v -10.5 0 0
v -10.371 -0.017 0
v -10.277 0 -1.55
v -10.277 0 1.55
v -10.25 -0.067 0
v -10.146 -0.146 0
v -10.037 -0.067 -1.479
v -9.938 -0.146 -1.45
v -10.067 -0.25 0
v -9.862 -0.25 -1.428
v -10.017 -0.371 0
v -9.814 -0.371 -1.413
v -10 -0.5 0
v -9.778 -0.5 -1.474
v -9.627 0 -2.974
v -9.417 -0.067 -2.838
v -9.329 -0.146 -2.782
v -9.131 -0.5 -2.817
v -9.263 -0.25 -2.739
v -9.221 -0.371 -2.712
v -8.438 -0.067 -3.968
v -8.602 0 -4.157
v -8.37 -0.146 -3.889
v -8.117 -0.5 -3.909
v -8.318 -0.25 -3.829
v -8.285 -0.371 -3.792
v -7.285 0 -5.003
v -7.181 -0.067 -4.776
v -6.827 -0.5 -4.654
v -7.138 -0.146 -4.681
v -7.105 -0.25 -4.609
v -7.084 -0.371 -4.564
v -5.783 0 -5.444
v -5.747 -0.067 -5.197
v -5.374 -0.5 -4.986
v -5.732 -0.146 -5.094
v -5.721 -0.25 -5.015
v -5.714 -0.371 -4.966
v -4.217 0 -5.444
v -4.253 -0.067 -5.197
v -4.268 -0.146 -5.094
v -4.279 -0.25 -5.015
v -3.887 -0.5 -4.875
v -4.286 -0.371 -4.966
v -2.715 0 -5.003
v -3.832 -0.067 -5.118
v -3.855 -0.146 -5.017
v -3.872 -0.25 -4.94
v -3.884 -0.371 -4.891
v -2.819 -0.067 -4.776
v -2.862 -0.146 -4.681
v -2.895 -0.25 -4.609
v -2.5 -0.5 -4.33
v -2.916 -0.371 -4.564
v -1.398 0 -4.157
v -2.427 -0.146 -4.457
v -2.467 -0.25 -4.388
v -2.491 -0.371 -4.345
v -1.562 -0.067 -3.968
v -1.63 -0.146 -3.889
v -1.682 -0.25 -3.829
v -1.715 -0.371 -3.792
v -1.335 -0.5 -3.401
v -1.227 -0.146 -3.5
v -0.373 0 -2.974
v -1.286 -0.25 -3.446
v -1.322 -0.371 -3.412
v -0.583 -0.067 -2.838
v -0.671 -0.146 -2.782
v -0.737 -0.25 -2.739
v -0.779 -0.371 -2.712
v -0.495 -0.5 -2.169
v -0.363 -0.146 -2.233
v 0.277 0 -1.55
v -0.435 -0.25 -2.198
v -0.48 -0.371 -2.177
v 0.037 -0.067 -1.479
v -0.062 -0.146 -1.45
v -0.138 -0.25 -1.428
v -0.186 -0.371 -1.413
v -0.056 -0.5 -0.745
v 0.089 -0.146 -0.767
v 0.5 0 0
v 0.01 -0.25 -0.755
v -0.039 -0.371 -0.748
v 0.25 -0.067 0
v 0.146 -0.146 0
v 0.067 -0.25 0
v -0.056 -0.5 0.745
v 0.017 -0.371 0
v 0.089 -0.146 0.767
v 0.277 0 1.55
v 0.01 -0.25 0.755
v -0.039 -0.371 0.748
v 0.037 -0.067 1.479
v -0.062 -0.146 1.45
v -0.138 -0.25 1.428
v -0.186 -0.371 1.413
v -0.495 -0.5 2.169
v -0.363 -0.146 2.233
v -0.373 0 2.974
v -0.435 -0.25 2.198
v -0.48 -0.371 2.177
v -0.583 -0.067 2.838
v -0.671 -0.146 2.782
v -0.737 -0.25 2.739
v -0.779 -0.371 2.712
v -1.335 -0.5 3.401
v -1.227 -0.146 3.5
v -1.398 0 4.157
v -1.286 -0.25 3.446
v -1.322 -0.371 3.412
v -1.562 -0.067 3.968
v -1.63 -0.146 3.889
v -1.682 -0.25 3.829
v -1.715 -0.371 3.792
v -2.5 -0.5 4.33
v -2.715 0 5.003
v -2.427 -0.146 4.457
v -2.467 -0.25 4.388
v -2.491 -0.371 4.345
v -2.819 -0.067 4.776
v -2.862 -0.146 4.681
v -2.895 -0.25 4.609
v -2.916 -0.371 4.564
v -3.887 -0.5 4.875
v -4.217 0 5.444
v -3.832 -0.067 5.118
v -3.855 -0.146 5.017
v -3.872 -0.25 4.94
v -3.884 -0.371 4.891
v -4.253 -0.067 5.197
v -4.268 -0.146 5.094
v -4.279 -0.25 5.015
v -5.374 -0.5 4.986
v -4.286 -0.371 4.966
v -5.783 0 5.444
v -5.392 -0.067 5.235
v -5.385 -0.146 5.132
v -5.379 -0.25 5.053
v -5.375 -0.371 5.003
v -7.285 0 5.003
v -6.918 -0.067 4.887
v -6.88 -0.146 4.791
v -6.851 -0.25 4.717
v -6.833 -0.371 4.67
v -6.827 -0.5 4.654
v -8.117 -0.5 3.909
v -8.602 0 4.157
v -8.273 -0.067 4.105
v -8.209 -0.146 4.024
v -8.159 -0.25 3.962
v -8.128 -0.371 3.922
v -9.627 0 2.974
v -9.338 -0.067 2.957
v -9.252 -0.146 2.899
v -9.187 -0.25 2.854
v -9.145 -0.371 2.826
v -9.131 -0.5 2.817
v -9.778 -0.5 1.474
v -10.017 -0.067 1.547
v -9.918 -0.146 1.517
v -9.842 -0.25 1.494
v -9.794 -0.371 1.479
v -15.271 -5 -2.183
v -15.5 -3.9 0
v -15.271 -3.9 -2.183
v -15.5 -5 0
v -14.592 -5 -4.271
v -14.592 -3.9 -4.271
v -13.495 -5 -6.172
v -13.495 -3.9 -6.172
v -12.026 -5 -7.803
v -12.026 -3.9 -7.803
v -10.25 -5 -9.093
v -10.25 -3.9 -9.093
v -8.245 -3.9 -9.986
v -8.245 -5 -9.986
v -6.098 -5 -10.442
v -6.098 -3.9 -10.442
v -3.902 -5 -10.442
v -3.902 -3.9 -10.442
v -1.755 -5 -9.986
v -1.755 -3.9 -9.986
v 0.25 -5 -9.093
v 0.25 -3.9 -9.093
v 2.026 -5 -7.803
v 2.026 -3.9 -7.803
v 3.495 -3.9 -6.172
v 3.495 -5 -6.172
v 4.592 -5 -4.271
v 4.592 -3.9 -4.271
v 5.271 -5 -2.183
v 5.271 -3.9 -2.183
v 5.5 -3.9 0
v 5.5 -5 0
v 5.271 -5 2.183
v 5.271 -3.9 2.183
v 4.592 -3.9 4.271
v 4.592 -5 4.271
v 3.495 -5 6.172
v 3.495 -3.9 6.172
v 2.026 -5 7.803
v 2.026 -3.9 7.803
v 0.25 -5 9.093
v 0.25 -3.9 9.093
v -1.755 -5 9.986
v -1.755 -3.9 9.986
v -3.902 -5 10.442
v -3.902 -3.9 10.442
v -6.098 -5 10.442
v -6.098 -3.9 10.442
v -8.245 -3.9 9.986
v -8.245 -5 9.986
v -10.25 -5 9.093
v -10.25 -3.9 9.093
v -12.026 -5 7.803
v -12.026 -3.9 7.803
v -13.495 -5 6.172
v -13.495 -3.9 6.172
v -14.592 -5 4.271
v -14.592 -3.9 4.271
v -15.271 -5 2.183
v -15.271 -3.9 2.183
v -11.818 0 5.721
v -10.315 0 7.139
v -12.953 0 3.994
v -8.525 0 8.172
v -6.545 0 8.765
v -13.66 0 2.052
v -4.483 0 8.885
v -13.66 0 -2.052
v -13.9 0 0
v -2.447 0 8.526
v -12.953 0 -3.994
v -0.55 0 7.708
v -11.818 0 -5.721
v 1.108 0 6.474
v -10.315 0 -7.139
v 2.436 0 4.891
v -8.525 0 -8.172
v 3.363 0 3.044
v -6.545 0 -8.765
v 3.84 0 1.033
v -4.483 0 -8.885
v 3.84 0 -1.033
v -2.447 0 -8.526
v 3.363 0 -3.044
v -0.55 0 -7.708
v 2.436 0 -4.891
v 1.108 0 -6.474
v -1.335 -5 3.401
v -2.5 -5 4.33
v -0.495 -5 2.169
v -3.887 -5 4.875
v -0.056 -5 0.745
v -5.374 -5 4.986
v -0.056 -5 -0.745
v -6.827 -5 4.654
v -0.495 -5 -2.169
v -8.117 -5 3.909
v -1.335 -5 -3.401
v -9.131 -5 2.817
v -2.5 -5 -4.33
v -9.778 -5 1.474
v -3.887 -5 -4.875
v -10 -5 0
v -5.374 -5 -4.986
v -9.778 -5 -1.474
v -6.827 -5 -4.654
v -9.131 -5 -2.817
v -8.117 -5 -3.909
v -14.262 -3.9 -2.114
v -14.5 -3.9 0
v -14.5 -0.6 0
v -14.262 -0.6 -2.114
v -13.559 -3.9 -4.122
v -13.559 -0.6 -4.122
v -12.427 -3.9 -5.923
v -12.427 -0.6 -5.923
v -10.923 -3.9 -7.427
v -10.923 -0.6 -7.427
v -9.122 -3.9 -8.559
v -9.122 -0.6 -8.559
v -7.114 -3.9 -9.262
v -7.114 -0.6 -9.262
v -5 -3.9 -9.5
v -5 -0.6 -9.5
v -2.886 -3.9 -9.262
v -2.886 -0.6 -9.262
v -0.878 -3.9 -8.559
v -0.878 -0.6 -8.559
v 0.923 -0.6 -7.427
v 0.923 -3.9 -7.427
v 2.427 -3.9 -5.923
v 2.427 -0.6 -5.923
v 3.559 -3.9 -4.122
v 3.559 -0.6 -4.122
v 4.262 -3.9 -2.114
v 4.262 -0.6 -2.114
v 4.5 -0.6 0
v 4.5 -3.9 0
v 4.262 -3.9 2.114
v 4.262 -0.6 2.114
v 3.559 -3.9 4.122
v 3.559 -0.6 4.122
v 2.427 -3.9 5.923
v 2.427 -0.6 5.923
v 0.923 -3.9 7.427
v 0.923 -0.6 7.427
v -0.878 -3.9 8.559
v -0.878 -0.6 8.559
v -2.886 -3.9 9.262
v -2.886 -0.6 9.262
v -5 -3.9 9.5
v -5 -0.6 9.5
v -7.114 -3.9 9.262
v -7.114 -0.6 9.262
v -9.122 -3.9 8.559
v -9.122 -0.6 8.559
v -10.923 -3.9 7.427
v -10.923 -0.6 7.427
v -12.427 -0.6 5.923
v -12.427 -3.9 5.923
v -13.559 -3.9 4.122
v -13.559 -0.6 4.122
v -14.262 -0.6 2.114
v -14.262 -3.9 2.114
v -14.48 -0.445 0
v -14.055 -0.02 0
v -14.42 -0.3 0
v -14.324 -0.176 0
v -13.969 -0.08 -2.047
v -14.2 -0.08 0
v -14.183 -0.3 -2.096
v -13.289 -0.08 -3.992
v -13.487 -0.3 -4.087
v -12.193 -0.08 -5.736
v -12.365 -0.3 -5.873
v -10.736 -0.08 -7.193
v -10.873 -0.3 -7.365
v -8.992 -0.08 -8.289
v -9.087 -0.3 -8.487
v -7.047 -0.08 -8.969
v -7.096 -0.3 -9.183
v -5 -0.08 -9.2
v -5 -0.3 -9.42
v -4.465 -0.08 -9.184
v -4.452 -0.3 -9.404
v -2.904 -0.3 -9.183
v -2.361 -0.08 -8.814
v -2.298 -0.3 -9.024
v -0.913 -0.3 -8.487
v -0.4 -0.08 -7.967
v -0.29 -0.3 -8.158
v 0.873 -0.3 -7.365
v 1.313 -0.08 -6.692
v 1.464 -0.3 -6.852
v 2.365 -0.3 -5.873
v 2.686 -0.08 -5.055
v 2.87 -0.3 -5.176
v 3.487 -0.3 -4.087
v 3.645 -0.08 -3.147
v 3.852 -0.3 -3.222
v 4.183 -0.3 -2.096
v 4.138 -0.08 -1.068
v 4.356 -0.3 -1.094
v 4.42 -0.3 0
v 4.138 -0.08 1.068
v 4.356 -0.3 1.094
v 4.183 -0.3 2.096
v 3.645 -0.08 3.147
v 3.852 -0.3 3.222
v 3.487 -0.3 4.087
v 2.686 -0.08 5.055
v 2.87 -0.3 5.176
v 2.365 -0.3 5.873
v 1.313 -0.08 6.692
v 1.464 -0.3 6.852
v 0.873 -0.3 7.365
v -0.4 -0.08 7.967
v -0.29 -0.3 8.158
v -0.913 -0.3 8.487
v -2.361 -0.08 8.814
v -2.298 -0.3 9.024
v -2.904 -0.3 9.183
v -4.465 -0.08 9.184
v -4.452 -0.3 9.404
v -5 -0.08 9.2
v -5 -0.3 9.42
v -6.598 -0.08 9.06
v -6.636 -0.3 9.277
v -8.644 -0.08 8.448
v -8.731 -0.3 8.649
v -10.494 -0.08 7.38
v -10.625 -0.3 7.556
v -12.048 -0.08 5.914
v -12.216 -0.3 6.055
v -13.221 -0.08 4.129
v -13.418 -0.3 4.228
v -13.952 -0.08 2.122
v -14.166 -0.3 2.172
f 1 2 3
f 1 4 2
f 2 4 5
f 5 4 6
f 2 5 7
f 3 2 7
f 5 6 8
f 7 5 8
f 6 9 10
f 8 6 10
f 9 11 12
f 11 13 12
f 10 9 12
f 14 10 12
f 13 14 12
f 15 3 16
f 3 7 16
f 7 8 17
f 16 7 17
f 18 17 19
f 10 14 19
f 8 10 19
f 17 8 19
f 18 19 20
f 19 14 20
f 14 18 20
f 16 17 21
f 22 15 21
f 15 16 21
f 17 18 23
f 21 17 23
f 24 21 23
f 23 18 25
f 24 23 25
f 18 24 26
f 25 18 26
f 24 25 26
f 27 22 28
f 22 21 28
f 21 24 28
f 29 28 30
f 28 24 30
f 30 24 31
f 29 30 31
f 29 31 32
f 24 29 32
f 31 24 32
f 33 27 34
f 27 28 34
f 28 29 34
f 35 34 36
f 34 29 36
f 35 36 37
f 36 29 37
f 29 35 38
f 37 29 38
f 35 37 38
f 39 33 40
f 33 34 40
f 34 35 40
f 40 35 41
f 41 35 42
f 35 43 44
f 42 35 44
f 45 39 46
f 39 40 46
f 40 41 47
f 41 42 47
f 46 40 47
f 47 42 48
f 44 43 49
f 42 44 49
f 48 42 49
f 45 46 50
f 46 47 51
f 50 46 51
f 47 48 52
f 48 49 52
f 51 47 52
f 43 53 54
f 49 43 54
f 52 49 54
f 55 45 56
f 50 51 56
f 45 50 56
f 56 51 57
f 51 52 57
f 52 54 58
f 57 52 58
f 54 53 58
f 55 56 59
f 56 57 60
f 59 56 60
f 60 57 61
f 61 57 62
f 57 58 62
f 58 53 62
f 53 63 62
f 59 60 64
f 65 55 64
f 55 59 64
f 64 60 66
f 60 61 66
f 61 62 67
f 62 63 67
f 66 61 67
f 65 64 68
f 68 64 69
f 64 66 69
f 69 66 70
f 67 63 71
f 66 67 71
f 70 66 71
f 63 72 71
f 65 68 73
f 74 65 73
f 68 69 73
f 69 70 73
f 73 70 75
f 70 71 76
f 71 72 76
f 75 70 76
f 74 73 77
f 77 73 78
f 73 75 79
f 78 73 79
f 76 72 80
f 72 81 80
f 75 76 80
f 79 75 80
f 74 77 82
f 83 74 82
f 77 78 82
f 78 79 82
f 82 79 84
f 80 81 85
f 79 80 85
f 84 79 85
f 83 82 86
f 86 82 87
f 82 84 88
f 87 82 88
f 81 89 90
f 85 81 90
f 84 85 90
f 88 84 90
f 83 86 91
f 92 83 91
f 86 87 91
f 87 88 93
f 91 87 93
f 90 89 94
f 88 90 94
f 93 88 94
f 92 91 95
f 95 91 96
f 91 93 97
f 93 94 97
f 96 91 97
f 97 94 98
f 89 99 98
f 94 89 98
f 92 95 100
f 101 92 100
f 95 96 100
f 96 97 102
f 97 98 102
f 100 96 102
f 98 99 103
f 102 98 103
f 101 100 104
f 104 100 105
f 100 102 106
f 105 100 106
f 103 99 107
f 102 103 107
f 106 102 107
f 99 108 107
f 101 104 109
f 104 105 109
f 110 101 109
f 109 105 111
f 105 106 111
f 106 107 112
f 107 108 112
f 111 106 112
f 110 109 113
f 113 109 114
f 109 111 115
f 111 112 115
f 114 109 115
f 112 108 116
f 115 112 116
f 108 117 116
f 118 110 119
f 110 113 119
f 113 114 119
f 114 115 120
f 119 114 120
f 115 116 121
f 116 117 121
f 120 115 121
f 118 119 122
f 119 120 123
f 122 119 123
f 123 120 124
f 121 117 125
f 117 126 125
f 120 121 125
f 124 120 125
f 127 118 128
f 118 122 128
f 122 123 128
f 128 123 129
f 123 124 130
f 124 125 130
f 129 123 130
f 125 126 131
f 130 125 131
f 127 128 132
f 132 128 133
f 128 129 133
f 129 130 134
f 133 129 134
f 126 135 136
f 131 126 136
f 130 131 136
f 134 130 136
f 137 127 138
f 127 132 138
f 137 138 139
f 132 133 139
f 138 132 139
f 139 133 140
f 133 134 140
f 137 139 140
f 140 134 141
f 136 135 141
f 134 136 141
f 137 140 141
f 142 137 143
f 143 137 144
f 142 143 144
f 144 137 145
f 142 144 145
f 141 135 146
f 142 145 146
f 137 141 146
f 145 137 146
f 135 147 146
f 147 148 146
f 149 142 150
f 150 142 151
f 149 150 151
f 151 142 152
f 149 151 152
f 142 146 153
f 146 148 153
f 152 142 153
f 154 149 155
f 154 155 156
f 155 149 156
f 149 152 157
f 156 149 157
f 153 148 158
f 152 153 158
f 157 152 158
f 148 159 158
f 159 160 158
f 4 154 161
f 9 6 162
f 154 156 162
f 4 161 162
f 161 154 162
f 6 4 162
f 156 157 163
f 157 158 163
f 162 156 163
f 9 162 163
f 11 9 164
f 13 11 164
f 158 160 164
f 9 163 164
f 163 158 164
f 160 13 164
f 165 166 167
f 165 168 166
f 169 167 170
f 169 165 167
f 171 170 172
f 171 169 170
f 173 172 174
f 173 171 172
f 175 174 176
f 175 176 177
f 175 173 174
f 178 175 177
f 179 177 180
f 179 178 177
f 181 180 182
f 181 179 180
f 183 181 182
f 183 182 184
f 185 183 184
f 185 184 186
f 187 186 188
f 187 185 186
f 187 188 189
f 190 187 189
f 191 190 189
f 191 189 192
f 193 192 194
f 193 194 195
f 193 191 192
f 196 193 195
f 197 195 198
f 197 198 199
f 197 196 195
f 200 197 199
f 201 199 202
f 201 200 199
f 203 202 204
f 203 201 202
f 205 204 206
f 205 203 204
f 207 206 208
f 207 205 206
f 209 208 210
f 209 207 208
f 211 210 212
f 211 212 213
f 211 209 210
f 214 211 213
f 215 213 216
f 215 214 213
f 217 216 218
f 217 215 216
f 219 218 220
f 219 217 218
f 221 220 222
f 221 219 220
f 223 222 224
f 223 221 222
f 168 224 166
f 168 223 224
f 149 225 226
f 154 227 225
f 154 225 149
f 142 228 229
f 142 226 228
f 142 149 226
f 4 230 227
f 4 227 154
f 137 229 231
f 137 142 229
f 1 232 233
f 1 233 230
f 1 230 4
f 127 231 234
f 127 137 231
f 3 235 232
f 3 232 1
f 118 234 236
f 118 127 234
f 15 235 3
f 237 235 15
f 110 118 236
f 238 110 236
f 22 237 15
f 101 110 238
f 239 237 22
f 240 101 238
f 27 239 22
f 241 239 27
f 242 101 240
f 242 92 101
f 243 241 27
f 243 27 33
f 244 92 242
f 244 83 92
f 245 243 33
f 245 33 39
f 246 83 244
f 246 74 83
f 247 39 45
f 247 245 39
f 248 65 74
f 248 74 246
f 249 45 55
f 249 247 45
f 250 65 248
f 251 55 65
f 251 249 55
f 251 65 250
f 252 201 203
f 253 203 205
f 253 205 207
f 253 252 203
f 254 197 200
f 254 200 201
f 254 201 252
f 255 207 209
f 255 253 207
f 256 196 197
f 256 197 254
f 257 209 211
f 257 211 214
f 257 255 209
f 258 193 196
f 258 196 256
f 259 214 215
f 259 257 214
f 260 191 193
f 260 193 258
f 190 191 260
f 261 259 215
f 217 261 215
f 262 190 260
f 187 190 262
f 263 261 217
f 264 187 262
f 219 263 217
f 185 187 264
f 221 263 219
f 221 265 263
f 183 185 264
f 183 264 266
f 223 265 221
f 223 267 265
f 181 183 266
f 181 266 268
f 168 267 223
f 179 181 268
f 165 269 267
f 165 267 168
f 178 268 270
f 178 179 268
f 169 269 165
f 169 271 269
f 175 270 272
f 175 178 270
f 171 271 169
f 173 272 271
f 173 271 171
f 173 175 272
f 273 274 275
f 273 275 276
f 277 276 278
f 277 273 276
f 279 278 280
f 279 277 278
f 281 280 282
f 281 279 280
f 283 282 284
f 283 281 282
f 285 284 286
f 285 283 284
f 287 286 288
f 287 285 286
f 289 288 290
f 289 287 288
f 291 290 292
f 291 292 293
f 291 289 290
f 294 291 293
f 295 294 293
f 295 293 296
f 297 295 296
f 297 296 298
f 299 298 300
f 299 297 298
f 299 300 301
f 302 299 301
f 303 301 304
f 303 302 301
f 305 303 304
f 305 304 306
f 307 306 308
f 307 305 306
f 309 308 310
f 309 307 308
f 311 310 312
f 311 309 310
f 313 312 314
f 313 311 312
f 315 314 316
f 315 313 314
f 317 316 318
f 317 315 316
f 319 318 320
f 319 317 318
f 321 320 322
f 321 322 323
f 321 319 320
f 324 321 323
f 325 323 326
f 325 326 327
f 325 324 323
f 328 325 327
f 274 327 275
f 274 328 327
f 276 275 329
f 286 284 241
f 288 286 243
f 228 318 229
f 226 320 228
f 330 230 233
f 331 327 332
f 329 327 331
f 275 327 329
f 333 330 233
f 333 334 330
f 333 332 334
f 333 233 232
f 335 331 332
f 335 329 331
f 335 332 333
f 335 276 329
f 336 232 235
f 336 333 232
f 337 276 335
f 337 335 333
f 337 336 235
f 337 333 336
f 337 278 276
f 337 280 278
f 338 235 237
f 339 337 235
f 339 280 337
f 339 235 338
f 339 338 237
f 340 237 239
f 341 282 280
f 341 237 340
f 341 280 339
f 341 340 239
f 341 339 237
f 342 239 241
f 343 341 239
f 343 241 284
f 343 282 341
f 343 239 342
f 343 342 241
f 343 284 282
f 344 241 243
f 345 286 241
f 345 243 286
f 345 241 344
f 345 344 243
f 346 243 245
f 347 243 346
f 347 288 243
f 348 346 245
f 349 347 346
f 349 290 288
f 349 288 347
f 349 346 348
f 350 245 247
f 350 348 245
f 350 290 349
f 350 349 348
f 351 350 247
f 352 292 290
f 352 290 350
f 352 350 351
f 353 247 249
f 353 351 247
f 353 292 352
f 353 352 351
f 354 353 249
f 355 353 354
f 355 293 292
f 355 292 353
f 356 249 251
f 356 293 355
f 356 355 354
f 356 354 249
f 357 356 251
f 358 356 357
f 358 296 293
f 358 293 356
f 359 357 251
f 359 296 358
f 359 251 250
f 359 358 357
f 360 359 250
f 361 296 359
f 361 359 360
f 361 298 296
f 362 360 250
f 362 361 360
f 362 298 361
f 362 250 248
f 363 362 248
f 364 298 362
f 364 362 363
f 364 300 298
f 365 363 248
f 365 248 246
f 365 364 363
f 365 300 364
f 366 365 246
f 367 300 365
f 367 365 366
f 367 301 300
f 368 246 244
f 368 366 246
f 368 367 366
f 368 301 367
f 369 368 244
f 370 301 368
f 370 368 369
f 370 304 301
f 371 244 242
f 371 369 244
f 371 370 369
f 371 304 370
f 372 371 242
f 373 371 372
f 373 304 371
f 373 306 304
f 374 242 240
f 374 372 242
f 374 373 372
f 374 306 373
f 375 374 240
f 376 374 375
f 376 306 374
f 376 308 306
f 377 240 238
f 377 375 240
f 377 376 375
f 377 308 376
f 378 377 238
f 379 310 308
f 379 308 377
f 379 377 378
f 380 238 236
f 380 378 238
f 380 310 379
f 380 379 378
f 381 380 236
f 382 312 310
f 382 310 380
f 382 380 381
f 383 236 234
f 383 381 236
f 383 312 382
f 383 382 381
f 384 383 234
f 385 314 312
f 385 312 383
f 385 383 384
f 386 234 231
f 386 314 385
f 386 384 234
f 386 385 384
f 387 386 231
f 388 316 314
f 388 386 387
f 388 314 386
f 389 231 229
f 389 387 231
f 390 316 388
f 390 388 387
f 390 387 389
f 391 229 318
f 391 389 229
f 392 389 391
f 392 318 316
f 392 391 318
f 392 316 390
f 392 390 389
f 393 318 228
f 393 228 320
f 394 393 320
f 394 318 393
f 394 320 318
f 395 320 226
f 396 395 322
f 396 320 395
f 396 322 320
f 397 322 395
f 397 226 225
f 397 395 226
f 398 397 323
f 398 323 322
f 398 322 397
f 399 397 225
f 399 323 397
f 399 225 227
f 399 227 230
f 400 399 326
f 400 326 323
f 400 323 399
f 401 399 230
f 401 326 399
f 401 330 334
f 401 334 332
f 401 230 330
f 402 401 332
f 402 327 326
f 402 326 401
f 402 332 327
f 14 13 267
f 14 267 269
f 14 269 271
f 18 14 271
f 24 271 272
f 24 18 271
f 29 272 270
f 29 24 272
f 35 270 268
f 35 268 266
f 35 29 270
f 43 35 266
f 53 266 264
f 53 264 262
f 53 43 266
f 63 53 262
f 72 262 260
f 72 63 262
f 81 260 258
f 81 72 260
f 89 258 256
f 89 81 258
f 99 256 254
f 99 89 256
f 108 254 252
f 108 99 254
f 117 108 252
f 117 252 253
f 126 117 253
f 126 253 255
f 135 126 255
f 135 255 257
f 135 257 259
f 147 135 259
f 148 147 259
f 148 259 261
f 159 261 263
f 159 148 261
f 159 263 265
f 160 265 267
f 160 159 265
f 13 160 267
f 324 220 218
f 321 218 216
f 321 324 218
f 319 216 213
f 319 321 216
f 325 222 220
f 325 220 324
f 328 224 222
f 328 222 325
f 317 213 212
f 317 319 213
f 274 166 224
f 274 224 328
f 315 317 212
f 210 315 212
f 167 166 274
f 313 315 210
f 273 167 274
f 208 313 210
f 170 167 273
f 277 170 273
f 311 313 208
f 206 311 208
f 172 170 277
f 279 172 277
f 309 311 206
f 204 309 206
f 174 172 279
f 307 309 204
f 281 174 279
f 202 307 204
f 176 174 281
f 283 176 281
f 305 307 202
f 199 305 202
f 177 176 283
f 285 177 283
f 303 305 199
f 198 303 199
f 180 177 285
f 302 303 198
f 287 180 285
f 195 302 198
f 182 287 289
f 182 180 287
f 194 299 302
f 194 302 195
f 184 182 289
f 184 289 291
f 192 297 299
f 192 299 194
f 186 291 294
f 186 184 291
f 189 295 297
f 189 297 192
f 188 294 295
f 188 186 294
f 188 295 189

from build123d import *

# Parameters (mm, degrees)
FILLET_1_R = 0.6
FILLET_2_R = 0.5


with BuildPart() as part:
    # 草图2 → 旋转1 (revolve)
    with BuildSketch(Plane.XY, mode=Mode.PRIVATE) as revolve_1_sk:
        Polygon((0, 0), (4.5, 0), (4.5, -3.9), (5.5, -3.9), (5.5, -5), (0, -5), align=None)
    revolve(revolve_1_sk.sketch.rotate(Axis((-5, 0, 0), (0, -1, 0)), 180), axis=Axis((-5, 0, 0), (0, -1, 0)))

    # 圆角1
    fillet_1_edges = [part.edges().sort_by_distance(p)[0] for p in [
        (4.5, 0, 0),
    ]]
    fillet(fillet_1_edges, radius=FILLET_1_R)

    # 圆角2
    fillet_2_edges = [part.edges().sort_by_distance(p)[0] for p in [
        (0, 0, 0),
    ]]
    fillet(fillet_2_edges, radius=FILLET_2_R)


solid = part.part
